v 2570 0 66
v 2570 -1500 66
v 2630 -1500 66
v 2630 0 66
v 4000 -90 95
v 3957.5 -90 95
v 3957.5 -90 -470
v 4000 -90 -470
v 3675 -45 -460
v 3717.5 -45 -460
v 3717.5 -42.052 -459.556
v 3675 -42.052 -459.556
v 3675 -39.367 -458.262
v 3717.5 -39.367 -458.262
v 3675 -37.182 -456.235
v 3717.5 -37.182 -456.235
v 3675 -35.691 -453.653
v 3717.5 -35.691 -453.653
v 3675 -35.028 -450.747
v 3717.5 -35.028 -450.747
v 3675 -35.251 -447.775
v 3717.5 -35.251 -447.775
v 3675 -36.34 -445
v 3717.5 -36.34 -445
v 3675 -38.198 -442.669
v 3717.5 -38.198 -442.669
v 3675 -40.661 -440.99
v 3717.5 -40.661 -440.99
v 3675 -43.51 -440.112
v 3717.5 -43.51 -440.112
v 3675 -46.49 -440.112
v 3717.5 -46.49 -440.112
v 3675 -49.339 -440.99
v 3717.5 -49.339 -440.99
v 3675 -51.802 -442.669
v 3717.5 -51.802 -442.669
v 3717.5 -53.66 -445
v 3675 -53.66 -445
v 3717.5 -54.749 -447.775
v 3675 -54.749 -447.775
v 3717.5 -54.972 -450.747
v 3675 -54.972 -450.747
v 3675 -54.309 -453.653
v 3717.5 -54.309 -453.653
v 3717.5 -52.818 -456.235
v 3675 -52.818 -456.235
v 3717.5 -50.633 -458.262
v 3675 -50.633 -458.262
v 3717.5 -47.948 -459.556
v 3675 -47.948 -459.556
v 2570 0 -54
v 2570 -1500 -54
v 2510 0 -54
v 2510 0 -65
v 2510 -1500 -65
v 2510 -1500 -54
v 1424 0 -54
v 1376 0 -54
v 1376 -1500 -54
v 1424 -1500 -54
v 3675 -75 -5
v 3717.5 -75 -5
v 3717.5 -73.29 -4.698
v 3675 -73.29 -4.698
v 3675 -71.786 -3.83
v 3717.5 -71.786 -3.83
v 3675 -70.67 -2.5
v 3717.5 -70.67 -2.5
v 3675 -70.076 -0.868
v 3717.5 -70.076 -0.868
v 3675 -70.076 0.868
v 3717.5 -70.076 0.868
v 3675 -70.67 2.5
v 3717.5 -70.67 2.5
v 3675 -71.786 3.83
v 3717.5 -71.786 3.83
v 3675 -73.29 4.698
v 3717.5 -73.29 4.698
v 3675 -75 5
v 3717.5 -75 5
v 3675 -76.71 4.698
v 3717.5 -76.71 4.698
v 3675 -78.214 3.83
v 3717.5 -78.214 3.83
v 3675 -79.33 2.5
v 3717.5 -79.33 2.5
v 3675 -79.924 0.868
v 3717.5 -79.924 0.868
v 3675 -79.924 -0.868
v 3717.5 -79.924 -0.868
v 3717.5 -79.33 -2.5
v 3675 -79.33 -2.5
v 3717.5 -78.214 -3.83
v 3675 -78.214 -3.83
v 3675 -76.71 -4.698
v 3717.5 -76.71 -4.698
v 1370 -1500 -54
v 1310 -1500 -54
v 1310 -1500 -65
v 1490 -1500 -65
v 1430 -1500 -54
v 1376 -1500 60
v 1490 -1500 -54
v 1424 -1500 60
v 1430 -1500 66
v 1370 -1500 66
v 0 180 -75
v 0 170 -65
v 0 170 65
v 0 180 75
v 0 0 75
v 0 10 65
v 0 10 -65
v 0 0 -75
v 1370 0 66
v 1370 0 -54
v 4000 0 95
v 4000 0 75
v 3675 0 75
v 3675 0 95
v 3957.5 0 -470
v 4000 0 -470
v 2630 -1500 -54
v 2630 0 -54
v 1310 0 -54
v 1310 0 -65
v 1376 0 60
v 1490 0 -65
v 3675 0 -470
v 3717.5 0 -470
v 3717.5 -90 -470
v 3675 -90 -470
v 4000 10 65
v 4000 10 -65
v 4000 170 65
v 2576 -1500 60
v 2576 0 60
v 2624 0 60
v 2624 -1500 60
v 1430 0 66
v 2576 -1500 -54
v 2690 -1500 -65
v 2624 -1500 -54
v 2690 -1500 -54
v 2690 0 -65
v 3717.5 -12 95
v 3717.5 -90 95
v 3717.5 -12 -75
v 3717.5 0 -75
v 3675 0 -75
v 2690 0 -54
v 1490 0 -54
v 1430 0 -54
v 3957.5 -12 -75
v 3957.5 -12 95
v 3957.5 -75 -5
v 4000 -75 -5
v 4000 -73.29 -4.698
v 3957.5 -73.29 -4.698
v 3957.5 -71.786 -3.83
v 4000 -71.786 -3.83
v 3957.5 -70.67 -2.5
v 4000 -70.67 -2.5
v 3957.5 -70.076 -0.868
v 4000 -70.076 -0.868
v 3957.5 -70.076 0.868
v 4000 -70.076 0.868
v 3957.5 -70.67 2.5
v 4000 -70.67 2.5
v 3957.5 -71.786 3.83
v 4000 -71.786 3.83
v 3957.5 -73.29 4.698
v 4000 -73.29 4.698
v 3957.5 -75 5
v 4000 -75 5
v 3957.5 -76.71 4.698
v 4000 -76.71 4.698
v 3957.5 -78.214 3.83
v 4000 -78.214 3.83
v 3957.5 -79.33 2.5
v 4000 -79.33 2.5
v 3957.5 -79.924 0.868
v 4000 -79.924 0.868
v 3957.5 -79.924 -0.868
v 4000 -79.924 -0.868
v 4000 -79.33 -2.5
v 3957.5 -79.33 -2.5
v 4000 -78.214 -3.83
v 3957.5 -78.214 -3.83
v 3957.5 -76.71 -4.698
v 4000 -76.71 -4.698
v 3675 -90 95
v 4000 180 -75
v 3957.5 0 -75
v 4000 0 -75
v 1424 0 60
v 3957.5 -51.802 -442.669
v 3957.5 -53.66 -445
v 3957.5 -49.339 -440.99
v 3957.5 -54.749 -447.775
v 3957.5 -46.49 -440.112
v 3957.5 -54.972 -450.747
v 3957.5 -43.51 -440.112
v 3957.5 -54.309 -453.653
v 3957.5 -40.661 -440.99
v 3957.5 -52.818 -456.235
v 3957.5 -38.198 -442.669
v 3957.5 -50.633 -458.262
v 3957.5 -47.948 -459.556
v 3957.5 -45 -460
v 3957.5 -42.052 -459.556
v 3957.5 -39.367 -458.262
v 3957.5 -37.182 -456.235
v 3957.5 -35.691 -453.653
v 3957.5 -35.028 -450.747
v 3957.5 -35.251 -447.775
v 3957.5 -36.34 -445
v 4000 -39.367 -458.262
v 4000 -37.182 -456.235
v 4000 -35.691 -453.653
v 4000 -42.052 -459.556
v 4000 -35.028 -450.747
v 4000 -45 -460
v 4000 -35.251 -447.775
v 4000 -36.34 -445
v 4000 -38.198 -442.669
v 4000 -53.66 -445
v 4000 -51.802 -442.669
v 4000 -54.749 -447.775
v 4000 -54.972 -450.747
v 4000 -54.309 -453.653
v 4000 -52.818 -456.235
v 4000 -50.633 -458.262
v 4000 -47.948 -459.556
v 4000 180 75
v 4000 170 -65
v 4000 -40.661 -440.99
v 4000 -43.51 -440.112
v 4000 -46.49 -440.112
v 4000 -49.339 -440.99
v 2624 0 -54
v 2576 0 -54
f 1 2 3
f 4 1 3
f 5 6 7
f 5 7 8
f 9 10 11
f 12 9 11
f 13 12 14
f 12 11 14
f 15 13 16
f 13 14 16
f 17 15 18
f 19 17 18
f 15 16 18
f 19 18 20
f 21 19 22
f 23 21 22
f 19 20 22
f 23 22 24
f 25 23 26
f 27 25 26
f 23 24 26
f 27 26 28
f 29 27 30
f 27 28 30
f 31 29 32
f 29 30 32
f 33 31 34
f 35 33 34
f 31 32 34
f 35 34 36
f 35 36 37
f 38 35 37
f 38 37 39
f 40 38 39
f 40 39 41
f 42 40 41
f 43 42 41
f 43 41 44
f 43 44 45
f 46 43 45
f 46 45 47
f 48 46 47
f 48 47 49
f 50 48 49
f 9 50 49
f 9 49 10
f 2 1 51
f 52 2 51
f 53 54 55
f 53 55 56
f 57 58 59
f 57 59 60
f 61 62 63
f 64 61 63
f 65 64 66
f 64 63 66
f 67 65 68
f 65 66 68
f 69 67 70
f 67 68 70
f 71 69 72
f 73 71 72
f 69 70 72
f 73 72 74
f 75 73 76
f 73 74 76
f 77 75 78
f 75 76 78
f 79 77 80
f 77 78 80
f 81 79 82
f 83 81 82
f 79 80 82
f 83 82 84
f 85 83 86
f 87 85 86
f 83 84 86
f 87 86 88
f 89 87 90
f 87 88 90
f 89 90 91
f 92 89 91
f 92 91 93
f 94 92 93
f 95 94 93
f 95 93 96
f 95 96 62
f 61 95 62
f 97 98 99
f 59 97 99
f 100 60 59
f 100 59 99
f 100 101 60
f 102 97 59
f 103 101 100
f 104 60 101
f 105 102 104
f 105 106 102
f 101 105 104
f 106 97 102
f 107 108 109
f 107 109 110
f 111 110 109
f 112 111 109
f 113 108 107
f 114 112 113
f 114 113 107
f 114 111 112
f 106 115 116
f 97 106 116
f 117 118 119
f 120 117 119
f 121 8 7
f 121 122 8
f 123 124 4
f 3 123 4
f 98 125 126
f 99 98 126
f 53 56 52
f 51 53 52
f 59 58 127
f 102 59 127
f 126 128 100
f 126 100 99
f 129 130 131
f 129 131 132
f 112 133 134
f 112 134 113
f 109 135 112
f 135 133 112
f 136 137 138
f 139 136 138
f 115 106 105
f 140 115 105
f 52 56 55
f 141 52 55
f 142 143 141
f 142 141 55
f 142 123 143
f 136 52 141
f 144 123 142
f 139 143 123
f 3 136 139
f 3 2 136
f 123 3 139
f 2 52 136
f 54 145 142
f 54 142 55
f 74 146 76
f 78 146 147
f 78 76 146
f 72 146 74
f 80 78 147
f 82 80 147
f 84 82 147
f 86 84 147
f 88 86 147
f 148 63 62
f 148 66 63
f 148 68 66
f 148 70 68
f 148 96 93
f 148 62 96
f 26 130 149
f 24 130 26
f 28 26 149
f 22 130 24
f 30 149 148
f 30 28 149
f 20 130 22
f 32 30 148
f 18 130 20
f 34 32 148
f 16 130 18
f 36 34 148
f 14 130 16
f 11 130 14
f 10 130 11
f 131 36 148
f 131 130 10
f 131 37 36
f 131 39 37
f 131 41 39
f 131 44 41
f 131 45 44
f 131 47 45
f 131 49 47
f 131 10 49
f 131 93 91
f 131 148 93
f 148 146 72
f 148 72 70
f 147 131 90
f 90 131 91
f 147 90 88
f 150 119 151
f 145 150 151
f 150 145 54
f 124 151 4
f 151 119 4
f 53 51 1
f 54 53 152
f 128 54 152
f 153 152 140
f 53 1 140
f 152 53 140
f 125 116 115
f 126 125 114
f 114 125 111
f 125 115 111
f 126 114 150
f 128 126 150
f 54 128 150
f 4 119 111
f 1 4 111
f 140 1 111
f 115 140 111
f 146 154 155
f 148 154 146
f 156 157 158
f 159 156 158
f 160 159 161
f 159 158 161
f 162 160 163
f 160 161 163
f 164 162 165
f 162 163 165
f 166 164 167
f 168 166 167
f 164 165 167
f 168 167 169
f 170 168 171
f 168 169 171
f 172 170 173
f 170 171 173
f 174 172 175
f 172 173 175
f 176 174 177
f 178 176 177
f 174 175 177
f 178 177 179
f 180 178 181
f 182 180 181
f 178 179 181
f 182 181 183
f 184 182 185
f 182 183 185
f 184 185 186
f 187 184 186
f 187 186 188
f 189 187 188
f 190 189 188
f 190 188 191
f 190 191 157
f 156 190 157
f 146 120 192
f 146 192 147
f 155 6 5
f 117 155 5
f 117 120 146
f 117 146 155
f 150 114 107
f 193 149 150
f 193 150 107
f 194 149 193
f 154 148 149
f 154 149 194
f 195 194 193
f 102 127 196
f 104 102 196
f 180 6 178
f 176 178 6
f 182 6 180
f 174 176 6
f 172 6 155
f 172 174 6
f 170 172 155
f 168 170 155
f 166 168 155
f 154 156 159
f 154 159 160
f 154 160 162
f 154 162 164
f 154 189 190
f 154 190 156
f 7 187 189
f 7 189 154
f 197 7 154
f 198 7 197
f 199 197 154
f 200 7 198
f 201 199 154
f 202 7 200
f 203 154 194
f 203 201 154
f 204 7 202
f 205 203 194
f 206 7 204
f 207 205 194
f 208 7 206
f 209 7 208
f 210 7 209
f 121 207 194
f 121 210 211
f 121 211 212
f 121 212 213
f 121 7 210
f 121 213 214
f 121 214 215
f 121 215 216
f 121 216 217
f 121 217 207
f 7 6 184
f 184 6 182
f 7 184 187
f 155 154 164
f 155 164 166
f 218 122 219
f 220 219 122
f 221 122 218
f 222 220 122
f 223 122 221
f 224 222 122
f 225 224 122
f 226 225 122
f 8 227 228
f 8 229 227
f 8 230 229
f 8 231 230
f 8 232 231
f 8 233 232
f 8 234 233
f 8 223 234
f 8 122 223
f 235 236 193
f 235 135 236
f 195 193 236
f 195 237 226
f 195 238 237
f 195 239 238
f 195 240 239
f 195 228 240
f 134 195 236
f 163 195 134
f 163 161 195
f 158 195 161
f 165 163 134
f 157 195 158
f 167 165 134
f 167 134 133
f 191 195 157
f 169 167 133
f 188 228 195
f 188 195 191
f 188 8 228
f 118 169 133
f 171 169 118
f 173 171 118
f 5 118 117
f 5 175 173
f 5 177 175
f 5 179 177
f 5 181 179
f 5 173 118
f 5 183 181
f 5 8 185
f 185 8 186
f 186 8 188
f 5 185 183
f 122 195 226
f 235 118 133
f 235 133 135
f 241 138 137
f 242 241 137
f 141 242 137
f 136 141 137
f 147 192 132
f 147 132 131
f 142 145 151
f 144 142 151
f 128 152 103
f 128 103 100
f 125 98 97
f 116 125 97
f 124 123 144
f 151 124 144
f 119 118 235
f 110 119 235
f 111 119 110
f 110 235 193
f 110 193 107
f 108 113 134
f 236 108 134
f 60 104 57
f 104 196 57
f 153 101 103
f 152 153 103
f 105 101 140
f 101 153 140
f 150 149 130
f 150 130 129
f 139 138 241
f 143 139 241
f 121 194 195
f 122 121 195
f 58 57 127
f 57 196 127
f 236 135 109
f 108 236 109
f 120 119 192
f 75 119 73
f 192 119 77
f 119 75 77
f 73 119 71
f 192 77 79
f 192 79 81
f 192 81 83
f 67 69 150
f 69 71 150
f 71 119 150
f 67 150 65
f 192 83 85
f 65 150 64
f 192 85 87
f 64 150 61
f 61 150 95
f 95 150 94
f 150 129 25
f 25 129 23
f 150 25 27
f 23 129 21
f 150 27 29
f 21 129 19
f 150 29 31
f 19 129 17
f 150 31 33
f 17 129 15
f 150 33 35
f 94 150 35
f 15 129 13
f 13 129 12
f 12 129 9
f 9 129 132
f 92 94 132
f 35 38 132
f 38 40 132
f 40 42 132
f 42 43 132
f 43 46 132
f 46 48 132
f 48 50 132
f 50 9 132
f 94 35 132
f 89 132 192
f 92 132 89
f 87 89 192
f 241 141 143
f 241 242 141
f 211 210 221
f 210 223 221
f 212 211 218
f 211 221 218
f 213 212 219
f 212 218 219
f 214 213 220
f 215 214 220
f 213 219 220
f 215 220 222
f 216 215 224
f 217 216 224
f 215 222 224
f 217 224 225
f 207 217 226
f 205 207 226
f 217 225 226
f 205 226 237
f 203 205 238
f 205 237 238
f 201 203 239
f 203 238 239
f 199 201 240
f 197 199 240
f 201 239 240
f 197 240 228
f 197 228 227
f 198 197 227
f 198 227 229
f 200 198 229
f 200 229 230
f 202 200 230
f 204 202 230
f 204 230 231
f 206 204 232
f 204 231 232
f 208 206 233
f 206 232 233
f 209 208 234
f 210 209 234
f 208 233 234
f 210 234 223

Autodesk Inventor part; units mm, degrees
ref_plane "YZ Plane" through (0, 0, 0) normal (1, 0, 0) x (0, 1, 0)
ref_plane "XZ Plane" through (0, 0, 0) normal (0, 1, 0) x (-1, 0, 0)
sketch "Sketch1" plane through (0, 0, 0) normal (0, 1, 0) x (-1, 0, 0)
  line L0 (0, 0) -> (-1400, 0) construction
  line L1 (-1400, 0) -> (-2600, 0) construction
  line L2 (-2600, 0) -> (-4000, 0) construction
  line L3 (-4000, 75) -> (0, 75)
  line L4 (0, 75) -> (0, -75)
  line L5 (0, -75) -> (-4000, -75)
  line L6 (-4000, -75) -> (-4000, 75)
  line L7 (-4000, 75) -> (0, -75) construction
  line L8 (0, 75) -> (-4000, -75) construction
  point P0 (-2000, 0)
  dimension "d0" = 1400
  dimension "d1" = 1200
  dimension "d2" = 1400
  dimension "d3" = 150
  dimension "d4" = 4000
extrude "Extrusion1" add sketch "Sketch1" along normal blind 180
shell "Shell1" thickness 10 removed faces 2 at (4000, 60, 25) at (0, 60, -25)
sketch "Sketch2" plane through (0, 0, 0) normal (0, -1, 0) x (1, 0, 0)
  line L0 (0, 0) -> (1400, 0) construction
  line L1 (1400, 0) -> (2600, 0) construction
  line L2 (2600, 0) -> (4000, 0) construction
  line L3 (0, -75) -> (0, 75) construction
  line L4 (4000, 75) -> (4000, -75) construction
  line L5 (0, 75) -> (4000, 75) construction
  line L6 (4000, 75) -> (4000, -75) construction
  line L7 (4000, -75) -> (0, -75) construction
  line L8 (0, -75) -> (0, 75) construction
  line L9 (3991, 66) -> (9, 66) construction
  line L10 (9, 66) -> (9, -66) construction
  line L11 (9, -66) -> (3991, -66) construction
  line L12 (3991, -66) -> (3991, 66) construction
  line L13 (1370, -66) -> (1370, 66) construction
  line L14 (1370, 66) -> (1430, 66) construction
  line L15 (1430, 66) -> (1430, -66) construction
  line L16 (1430, -66) -> (1370, -66) construction
  line L17 (1370, -66) -> (1430, 66) construction
  line L18 (1370, 66) -> (1430, -66) construction
  line L19 (1310, -66) -> (1310, 66) construction
  line L20 (1310, 66) -> (1490, 66) construction
  line L21 (1490, 66) -> (1490, -66) construction
  line L22 (1490, -66) -> (1310, -66) construction
  line L23 (1310, -66) -> (1490, 66) construction
  line L24 (1310, 66) -> (1490, -66) construction
  line L25 (1310, -66) -> (1490, -66) construction
  line L26 (1490, -66) -> (1490, -54) construction
  line L27 (1490, -54) -> (1310, -54) construction
  line L28 (1310, -54) -> (1310, -66) construction
  line L29 (1370, -54) -> (1430, -54) construction
  line L30 (1430, -54) -> (1430, 66) construction
  line L31 (1430, 66) -> (1370, 66) construction
  line L32 (1370, 66) -> (1370, -54) construction
  line L33 (1310, -54) -> (1370, -54)
  line L34 (1370, 66) -> (1370, -54)
  line L35 (1430, -54) -> (1430, 66)
  line L36 (1370, 66) -> (1430, 66)
  line L37 (1430, -54) -> (1490, -54)
  line L38 (1310, -54) -> (1310, -66)
  line L39 (1310, -66) -> (1490, -66)
  line L40 (1490, -54) -> (1490, -66)
  line L41 (4000, -65) -> (0, -65) projected
  line L42 (1376, -54) -> (1376, 60)
  line L43 (1376, 60) -> (1424, 60)
  line L44 (1424, 60) -> (1424, -54)
  line L45 (1376, -54) -> (1424, -54)
  point P0 (1310, -65)
  point P1 (1490, -65)
  dimension "d8" = 1400
  dimension "d9" = 1200
  dimension "d10" = 1400
  dimension "d11" = 9
  dimension "d12" = 60
  dimension "d13" = 180
  dimension "d14" = 12
  dimension "d15" = 6
  dimension "d16" = 114
extrude "Extrusion2" add sketch "Sketch2" along normal blind 1500 contours L33 L34 L36 L35 L37 L40 L41 L38
ref_plane "Work Plane1" through (1400, -1500, -54) normal (1, 0, 0) x (0, 0, -1)
ref_plane "Work Plane3" through (2000, -1500, -54) normal (1, 0, 0) x (0, 0, -1)
ref_plane "Work Plane2" through (2600, -1500, -54) normal (1, 0, 0) x (0, 0, -1)
mirror "Mirror1" about plane through (2000, -1500, -54) normal (1, 0, 0) of "Extrusion2"
sketch "Sketch3" plane through (0, 0, 75) normal (0, 0, 1) x (1, 0, 0)
  line L0 (4000, 0) -> (0, 0) projected
  line L1 (4000, 0) -> (3675, 0)
  line L2 (3675, 0) -> (3675, -90)
  line L3 (3675, -90) -> (4000, -90)
  line L4 (4000, -90) -> (4000, 0)
  line L5 (3675, 0) -> (3717.5, 0)
  line L6 (3717.5, 0) -> (3717.5, -90)
  line L7 (3717.5, -90) -> (3675, -90)
  line L8 (3675, -90) -> (3675, 0)
  line L9 (4000, -90) -> (3957.5, -90)
  line L10 (3957.5, -90) -> (3957.5, 0)
  line L11 (3957.5, 0) -> (4000, 0)
  line L12 (4000, 0) -> (4000, -90)
  line L13 (3717.5, 0) -> (3957.5, 0)
  line L14 (3957.5, 0) -> (3957.5, -12)
  line L15 (3957.5, -12) -> (3717.5, -12)
  line L16 (3717.5, -12) -> (3717.5, 0)
  dimension "d20" = 325
  dimension "d21" = 90
  dimension "d22" = 42.5
  dimension "d23" = 42.5
  dimension "d24" = 90
  dimension "d25" = 12
extrude "Extrusion3" add sketch "Sketch3" along normal blind 20 and the other way blind 150 contours L4 L3 L10 L0 | L10 L15 L6 L0 | L6 L3 L2 L0
sketch "Sketch5" plane through (4000, 180, -75) normal (0, 0, -1) x (-1, 0, 0)
  line L0 (0, 0) -> (0, -270) projected
  line L1 (0, -270) -> (42.5, -270)
  line L2 (42.5, -270) -> (42.5, -180)
  line L3 (42.5, -180) -> (0, -180)
  line L4 (0, -180) -> (0, -270)
  line L5 (282.5, -270) -> (325, -270) projected
  line L6 (325, -270) -> (282.5, -270)
  line L7 (282.5, -270) -> (282.5, -180)
  line L8 (282.5, -180) -> (325, -180)
  line L9 (325, -180) -> (325, -270)
  point P0 (4000, -180)
  dimension "d36" = 90
  dimension "d37" = 42.5
  dimension "d38" = 90
extrude "Extrusion4" add sketch "Sketch5" along normal blind 395
sketch "Sketch6" plane through (4000, 180, 75) normal (1, 0, 0) x (0, 0, -1)
  line L0 (-20, -192) -> (-20, -270) projected
  line L1 (-20, -270) -> (75, -270) construction
  line L2 (75, -270) -> (75, -255) construction
  line L3 (75, -255) -> (-20, -255) construction
  line L4 (-20, -255) -> (-20, -270) construction
  circle A0 centre (75, -255) radius 5
  line L5 (150, -180) -> (545, -180) projected
  line L6 (545, -180) -> (525, -180) construction
  line L7 (525, -180) -> (525, -225) construction
  line L8 (525, -225) -> (545, -225) construction
  line L9 (545, -225) -> (545, -180) construction
  circle A1 centre (525, -225) radius 10
  point P0 (75, -180)
  dimension "d41" = 95
  dimension "d42" = 15
  dimension "d43" = 10
  dimension "d44" = 20
  dimension "d45" = 20
extrude "Extrusion5" cut sketch "Sketch6" against normal up to surface (325 mm away)
properties part number "Trave_e_Pale_inventor_single"
